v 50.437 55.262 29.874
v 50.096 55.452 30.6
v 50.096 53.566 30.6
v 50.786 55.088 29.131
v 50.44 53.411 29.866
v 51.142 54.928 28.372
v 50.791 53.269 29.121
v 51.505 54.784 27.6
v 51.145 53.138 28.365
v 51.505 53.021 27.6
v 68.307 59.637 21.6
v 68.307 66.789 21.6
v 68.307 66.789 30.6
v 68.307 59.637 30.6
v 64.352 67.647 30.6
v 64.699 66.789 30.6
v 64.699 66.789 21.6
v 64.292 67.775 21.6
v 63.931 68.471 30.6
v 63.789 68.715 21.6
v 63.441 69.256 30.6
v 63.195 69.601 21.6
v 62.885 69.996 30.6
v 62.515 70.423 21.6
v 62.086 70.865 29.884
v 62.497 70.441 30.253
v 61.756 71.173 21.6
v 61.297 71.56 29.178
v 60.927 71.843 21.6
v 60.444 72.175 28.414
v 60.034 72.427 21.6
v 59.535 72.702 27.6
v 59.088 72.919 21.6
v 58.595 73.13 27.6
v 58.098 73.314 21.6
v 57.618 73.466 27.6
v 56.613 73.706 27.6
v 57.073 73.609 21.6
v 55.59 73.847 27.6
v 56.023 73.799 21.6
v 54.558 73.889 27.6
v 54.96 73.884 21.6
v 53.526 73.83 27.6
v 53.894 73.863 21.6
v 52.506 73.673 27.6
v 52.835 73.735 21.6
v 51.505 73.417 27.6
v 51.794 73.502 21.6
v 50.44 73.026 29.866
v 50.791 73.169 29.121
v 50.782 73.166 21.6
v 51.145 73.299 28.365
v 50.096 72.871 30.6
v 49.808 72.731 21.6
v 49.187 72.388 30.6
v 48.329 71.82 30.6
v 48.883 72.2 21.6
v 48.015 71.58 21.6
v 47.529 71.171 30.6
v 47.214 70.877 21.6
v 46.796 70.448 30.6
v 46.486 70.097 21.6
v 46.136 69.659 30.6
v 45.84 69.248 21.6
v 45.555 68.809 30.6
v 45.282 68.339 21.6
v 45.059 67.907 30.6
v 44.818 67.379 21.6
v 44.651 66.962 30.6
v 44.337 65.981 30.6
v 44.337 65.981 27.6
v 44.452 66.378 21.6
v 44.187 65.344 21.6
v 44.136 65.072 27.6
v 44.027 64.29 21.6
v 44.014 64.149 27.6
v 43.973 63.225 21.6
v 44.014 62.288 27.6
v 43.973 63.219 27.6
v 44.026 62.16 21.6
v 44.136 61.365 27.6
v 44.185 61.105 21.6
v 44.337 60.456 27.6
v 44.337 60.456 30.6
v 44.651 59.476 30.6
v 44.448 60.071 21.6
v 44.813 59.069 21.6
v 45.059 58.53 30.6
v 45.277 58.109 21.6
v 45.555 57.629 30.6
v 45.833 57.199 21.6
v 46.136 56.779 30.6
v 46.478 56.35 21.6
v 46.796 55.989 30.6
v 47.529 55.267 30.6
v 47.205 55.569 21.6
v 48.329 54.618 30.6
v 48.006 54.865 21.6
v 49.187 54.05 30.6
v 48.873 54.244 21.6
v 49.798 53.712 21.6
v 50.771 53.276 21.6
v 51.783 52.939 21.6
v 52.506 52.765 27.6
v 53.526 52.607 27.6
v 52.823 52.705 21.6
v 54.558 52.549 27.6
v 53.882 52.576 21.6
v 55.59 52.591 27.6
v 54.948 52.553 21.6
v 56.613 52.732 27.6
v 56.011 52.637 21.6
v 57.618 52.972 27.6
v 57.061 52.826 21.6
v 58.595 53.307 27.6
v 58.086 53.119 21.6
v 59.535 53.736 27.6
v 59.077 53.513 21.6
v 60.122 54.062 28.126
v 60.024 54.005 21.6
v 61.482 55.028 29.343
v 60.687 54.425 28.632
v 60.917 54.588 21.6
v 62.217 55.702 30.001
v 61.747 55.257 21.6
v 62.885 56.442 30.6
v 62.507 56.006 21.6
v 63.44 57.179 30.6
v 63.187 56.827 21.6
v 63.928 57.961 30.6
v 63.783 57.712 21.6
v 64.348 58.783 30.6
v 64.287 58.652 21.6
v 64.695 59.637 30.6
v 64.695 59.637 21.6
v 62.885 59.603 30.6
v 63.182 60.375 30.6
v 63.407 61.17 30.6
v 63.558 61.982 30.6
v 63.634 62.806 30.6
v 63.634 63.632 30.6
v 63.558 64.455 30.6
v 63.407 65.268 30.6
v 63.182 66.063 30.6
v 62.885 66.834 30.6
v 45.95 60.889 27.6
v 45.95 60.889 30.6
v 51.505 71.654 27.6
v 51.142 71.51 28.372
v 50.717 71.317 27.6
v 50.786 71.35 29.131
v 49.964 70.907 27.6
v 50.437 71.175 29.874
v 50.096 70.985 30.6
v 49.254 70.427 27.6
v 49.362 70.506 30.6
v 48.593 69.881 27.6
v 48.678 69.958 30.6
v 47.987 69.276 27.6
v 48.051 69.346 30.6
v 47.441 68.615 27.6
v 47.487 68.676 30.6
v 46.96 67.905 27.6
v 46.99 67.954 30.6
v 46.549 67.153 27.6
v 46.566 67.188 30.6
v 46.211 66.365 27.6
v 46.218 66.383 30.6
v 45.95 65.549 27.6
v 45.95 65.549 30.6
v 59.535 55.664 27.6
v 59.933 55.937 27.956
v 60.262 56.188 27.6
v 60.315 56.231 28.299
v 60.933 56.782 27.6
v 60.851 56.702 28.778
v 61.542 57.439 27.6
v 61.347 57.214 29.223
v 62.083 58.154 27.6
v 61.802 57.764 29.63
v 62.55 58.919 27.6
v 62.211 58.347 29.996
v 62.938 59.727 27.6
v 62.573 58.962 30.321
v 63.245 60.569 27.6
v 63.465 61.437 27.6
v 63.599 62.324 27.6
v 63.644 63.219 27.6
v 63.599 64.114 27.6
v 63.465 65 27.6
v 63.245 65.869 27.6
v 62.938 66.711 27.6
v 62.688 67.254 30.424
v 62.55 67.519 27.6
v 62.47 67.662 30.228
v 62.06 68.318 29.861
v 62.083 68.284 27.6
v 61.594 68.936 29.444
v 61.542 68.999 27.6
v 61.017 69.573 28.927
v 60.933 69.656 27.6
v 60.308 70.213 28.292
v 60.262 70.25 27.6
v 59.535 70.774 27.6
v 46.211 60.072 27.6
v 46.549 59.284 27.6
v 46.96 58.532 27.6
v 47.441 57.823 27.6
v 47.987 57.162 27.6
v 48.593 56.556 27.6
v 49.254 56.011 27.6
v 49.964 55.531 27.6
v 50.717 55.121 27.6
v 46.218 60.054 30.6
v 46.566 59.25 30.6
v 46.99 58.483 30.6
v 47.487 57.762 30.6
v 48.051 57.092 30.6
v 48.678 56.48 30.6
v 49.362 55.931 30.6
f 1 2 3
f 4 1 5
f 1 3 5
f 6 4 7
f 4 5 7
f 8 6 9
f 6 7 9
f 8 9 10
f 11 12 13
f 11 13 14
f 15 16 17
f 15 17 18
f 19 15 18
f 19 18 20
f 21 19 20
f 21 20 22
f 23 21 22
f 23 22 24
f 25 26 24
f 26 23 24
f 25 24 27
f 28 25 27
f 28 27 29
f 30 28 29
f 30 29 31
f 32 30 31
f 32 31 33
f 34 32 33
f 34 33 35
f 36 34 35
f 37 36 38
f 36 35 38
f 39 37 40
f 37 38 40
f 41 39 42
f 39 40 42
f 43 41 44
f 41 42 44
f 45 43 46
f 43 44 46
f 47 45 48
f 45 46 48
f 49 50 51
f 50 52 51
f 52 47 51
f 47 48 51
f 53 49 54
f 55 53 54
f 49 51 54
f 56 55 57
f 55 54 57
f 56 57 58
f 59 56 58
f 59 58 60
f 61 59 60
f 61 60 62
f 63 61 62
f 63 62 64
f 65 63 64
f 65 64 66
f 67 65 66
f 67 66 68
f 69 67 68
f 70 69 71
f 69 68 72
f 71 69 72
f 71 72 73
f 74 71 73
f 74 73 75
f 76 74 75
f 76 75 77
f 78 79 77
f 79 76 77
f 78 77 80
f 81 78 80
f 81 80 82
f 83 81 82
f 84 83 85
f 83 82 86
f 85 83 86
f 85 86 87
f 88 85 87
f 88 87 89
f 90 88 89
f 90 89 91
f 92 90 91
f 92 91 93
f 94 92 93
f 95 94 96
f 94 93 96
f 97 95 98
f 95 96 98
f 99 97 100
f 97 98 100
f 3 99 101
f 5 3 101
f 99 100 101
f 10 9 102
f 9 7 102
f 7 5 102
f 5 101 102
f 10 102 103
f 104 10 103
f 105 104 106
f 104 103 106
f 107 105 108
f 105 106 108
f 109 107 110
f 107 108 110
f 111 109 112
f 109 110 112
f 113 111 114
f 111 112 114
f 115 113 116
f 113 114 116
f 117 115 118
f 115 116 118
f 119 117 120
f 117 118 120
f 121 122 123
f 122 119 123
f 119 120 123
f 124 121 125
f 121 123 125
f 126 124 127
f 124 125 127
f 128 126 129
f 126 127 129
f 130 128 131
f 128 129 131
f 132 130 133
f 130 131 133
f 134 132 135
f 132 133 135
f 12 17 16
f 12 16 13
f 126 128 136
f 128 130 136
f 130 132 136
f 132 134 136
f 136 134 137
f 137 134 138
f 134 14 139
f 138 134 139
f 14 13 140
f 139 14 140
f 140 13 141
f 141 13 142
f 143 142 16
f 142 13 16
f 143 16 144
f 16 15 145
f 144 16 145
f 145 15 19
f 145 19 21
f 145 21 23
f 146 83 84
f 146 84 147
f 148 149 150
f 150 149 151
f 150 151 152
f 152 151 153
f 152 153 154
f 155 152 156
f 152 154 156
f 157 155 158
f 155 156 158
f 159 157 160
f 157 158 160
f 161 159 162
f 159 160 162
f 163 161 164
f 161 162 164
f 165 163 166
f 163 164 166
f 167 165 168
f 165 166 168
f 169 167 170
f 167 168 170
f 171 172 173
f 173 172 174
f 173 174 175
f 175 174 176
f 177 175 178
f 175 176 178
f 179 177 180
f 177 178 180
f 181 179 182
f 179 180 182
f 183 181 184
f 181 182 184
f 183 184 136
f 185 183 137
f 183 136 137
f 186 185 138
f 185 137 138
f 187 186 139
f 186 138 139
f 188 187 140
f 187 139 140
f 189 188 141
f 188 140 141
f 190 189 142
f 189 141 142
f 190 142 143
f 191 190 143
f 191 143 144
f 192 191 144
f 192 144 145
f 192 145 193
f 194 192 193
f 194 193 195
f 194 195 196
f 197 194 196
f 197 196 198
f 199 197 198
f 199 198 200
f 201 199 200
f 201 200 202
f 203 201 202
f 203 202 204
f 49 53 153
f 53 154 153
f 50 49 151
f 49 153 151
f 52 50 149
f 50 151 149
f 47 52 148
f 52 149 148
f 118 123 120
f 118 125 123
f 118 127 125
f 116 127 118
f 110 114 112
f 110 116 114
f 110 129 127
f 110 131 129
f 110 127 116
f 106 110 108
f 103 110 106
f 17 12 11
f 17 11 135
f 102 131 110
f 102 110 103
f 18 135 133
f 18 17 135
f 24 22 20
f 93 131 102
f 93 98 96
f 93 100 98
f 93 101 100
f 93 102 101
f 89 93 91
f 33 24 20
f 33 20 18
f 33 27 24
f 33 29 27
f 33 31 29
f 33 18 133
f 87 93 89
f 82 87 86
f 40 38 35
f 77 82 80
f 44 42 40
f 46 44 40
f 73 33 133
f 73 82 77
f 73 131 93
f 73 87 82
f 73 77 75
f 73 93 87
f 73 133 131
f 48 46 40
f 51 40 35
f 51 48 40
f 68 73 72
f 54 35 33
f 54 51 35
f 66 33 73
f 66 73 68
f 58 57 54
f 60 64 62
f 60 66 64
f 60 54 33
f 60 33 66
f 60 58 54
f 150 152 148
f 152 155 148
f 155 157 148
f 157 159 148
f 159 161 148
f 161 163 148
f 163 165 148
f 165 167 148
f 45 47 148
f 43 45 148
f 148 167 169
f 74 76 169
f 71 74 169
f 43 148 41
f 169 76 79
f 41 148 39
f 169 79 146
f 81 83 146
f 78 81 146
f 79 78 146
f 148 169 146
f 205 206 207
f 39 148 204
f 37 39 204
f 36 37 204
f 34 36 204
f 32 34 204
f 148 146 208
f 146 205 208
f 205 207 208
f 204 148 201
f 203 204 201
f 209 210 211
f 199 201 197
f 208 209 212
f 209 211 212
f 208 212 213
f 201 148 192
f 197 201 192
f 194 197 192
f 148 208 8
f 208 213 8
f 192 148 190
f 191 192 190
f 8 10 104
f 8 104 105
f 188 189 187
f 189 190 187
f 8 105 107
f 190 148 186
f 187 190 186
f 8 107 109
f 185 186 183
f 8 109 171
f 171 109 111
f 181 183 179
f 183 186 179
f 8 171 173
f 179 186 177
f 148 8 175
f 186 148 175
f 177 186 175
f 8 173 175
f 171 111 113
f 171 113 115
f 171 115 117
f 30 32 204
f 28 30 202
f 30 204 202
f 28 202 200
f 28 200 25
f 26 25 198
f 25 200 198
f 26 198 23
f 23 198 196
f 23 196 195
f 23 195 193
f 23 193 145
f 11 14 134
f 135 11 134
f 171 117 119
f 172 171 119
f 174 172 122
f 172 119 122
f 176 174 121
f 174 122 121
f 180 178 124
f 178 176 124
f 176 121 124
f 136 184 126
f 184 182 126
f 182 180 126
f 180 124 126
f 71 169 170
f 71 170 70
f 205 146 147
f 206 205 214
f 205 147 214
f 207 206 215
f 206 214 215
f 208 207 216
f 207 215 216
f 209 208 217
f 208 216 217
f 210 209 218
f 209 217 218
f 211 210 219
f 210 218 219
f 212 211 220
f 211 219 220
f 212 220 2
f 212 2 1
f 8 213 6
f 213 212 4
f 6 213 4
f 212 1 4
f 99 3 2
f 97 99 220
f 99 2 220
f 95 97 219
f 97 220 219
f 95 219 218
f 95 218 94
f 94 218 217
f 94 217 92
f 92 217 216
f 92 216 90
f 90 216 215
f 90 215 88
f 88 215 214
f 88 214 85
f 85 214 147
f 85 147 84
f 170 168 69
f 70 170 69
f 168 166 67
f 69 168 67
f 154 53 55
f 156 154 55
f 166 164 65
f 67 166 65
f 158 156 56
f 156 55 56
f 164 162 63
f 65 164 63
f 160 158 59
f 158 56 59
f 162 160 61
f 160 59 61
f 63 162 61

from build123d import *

# Parameters (mm, degrees)
PAD063_DEPTH    = 9
SKETCH096_R     = 9
POCKET019_DEPTH = 3
POCKET020_DEPTH = 24.2527662109
POCKET021_DEPTH = 3


with BuildPart() as part:
    # Sketch095 → Pad063 (new body)
    with BuildSketch(Plane.XY.offset(1.6)):
        with BuildLine():
            Line((64.6986240714, 66.789096024), (68.3068088834, 66.789096024))
            Line((68.3068088834, 66.789096024), (68.3068088834, 59.6371823367))
            Line((68.3068088834, 59.6371823367), (64.6946039998, 59.6371823367))
            ThreePointArc((64.6986240714, 66.789096024), (43.973359138, 63.2247876667), (64.6946039998, 59.6371823367))
        make_face()
    extrude(amount=PAD063_DEPTH)

    # Sketch096 (on Face6 of Pad063) → Pocket019 (cut)
    with BuildSketch(Plane.XY.offset(10.6)):
        with Locations((54.643516, 63.21879)):
            Circle(SKETCH096_R)
    extrude(amount=-POCKET019_DEPTH, mode=Mode.SUBTRACT)

    # Sketch097 (on DatumPlane) → Pocket020 (cut, through all)
    with BuildSketch(Plane(origin=(0, 49.6371823367, 1.6), x_dir=(1, 0, 0), z_dir=(0, -1, 0))):
        Polygon((47.624802, 14.26), (51.504802, 6), (59.534802, 6), (66.034802, 11.82), align=None)
    extrude(amount=-POCKET020_DEPTH, mode=Mode.SUBTRACT)

    # Sketch098 (on Face10 of Pocket020) → Pocket021 (cut)
    with BuildSketch(Plane.XY.offset(10.6)):
        Polygon((54.643516, 63.21879), (36.6761624803, 68.0350836562), (36.6761624803, 58.4024963438), align=None)
    extrude(amount=-POCKET021_DEPTH, mode=Mode.SUBTRACT)


with BuildPart() as part_1:
    # Body011 placement: moved
    add(part.part.moved(Location((0, 0, 20))))


solid = part_1.part
